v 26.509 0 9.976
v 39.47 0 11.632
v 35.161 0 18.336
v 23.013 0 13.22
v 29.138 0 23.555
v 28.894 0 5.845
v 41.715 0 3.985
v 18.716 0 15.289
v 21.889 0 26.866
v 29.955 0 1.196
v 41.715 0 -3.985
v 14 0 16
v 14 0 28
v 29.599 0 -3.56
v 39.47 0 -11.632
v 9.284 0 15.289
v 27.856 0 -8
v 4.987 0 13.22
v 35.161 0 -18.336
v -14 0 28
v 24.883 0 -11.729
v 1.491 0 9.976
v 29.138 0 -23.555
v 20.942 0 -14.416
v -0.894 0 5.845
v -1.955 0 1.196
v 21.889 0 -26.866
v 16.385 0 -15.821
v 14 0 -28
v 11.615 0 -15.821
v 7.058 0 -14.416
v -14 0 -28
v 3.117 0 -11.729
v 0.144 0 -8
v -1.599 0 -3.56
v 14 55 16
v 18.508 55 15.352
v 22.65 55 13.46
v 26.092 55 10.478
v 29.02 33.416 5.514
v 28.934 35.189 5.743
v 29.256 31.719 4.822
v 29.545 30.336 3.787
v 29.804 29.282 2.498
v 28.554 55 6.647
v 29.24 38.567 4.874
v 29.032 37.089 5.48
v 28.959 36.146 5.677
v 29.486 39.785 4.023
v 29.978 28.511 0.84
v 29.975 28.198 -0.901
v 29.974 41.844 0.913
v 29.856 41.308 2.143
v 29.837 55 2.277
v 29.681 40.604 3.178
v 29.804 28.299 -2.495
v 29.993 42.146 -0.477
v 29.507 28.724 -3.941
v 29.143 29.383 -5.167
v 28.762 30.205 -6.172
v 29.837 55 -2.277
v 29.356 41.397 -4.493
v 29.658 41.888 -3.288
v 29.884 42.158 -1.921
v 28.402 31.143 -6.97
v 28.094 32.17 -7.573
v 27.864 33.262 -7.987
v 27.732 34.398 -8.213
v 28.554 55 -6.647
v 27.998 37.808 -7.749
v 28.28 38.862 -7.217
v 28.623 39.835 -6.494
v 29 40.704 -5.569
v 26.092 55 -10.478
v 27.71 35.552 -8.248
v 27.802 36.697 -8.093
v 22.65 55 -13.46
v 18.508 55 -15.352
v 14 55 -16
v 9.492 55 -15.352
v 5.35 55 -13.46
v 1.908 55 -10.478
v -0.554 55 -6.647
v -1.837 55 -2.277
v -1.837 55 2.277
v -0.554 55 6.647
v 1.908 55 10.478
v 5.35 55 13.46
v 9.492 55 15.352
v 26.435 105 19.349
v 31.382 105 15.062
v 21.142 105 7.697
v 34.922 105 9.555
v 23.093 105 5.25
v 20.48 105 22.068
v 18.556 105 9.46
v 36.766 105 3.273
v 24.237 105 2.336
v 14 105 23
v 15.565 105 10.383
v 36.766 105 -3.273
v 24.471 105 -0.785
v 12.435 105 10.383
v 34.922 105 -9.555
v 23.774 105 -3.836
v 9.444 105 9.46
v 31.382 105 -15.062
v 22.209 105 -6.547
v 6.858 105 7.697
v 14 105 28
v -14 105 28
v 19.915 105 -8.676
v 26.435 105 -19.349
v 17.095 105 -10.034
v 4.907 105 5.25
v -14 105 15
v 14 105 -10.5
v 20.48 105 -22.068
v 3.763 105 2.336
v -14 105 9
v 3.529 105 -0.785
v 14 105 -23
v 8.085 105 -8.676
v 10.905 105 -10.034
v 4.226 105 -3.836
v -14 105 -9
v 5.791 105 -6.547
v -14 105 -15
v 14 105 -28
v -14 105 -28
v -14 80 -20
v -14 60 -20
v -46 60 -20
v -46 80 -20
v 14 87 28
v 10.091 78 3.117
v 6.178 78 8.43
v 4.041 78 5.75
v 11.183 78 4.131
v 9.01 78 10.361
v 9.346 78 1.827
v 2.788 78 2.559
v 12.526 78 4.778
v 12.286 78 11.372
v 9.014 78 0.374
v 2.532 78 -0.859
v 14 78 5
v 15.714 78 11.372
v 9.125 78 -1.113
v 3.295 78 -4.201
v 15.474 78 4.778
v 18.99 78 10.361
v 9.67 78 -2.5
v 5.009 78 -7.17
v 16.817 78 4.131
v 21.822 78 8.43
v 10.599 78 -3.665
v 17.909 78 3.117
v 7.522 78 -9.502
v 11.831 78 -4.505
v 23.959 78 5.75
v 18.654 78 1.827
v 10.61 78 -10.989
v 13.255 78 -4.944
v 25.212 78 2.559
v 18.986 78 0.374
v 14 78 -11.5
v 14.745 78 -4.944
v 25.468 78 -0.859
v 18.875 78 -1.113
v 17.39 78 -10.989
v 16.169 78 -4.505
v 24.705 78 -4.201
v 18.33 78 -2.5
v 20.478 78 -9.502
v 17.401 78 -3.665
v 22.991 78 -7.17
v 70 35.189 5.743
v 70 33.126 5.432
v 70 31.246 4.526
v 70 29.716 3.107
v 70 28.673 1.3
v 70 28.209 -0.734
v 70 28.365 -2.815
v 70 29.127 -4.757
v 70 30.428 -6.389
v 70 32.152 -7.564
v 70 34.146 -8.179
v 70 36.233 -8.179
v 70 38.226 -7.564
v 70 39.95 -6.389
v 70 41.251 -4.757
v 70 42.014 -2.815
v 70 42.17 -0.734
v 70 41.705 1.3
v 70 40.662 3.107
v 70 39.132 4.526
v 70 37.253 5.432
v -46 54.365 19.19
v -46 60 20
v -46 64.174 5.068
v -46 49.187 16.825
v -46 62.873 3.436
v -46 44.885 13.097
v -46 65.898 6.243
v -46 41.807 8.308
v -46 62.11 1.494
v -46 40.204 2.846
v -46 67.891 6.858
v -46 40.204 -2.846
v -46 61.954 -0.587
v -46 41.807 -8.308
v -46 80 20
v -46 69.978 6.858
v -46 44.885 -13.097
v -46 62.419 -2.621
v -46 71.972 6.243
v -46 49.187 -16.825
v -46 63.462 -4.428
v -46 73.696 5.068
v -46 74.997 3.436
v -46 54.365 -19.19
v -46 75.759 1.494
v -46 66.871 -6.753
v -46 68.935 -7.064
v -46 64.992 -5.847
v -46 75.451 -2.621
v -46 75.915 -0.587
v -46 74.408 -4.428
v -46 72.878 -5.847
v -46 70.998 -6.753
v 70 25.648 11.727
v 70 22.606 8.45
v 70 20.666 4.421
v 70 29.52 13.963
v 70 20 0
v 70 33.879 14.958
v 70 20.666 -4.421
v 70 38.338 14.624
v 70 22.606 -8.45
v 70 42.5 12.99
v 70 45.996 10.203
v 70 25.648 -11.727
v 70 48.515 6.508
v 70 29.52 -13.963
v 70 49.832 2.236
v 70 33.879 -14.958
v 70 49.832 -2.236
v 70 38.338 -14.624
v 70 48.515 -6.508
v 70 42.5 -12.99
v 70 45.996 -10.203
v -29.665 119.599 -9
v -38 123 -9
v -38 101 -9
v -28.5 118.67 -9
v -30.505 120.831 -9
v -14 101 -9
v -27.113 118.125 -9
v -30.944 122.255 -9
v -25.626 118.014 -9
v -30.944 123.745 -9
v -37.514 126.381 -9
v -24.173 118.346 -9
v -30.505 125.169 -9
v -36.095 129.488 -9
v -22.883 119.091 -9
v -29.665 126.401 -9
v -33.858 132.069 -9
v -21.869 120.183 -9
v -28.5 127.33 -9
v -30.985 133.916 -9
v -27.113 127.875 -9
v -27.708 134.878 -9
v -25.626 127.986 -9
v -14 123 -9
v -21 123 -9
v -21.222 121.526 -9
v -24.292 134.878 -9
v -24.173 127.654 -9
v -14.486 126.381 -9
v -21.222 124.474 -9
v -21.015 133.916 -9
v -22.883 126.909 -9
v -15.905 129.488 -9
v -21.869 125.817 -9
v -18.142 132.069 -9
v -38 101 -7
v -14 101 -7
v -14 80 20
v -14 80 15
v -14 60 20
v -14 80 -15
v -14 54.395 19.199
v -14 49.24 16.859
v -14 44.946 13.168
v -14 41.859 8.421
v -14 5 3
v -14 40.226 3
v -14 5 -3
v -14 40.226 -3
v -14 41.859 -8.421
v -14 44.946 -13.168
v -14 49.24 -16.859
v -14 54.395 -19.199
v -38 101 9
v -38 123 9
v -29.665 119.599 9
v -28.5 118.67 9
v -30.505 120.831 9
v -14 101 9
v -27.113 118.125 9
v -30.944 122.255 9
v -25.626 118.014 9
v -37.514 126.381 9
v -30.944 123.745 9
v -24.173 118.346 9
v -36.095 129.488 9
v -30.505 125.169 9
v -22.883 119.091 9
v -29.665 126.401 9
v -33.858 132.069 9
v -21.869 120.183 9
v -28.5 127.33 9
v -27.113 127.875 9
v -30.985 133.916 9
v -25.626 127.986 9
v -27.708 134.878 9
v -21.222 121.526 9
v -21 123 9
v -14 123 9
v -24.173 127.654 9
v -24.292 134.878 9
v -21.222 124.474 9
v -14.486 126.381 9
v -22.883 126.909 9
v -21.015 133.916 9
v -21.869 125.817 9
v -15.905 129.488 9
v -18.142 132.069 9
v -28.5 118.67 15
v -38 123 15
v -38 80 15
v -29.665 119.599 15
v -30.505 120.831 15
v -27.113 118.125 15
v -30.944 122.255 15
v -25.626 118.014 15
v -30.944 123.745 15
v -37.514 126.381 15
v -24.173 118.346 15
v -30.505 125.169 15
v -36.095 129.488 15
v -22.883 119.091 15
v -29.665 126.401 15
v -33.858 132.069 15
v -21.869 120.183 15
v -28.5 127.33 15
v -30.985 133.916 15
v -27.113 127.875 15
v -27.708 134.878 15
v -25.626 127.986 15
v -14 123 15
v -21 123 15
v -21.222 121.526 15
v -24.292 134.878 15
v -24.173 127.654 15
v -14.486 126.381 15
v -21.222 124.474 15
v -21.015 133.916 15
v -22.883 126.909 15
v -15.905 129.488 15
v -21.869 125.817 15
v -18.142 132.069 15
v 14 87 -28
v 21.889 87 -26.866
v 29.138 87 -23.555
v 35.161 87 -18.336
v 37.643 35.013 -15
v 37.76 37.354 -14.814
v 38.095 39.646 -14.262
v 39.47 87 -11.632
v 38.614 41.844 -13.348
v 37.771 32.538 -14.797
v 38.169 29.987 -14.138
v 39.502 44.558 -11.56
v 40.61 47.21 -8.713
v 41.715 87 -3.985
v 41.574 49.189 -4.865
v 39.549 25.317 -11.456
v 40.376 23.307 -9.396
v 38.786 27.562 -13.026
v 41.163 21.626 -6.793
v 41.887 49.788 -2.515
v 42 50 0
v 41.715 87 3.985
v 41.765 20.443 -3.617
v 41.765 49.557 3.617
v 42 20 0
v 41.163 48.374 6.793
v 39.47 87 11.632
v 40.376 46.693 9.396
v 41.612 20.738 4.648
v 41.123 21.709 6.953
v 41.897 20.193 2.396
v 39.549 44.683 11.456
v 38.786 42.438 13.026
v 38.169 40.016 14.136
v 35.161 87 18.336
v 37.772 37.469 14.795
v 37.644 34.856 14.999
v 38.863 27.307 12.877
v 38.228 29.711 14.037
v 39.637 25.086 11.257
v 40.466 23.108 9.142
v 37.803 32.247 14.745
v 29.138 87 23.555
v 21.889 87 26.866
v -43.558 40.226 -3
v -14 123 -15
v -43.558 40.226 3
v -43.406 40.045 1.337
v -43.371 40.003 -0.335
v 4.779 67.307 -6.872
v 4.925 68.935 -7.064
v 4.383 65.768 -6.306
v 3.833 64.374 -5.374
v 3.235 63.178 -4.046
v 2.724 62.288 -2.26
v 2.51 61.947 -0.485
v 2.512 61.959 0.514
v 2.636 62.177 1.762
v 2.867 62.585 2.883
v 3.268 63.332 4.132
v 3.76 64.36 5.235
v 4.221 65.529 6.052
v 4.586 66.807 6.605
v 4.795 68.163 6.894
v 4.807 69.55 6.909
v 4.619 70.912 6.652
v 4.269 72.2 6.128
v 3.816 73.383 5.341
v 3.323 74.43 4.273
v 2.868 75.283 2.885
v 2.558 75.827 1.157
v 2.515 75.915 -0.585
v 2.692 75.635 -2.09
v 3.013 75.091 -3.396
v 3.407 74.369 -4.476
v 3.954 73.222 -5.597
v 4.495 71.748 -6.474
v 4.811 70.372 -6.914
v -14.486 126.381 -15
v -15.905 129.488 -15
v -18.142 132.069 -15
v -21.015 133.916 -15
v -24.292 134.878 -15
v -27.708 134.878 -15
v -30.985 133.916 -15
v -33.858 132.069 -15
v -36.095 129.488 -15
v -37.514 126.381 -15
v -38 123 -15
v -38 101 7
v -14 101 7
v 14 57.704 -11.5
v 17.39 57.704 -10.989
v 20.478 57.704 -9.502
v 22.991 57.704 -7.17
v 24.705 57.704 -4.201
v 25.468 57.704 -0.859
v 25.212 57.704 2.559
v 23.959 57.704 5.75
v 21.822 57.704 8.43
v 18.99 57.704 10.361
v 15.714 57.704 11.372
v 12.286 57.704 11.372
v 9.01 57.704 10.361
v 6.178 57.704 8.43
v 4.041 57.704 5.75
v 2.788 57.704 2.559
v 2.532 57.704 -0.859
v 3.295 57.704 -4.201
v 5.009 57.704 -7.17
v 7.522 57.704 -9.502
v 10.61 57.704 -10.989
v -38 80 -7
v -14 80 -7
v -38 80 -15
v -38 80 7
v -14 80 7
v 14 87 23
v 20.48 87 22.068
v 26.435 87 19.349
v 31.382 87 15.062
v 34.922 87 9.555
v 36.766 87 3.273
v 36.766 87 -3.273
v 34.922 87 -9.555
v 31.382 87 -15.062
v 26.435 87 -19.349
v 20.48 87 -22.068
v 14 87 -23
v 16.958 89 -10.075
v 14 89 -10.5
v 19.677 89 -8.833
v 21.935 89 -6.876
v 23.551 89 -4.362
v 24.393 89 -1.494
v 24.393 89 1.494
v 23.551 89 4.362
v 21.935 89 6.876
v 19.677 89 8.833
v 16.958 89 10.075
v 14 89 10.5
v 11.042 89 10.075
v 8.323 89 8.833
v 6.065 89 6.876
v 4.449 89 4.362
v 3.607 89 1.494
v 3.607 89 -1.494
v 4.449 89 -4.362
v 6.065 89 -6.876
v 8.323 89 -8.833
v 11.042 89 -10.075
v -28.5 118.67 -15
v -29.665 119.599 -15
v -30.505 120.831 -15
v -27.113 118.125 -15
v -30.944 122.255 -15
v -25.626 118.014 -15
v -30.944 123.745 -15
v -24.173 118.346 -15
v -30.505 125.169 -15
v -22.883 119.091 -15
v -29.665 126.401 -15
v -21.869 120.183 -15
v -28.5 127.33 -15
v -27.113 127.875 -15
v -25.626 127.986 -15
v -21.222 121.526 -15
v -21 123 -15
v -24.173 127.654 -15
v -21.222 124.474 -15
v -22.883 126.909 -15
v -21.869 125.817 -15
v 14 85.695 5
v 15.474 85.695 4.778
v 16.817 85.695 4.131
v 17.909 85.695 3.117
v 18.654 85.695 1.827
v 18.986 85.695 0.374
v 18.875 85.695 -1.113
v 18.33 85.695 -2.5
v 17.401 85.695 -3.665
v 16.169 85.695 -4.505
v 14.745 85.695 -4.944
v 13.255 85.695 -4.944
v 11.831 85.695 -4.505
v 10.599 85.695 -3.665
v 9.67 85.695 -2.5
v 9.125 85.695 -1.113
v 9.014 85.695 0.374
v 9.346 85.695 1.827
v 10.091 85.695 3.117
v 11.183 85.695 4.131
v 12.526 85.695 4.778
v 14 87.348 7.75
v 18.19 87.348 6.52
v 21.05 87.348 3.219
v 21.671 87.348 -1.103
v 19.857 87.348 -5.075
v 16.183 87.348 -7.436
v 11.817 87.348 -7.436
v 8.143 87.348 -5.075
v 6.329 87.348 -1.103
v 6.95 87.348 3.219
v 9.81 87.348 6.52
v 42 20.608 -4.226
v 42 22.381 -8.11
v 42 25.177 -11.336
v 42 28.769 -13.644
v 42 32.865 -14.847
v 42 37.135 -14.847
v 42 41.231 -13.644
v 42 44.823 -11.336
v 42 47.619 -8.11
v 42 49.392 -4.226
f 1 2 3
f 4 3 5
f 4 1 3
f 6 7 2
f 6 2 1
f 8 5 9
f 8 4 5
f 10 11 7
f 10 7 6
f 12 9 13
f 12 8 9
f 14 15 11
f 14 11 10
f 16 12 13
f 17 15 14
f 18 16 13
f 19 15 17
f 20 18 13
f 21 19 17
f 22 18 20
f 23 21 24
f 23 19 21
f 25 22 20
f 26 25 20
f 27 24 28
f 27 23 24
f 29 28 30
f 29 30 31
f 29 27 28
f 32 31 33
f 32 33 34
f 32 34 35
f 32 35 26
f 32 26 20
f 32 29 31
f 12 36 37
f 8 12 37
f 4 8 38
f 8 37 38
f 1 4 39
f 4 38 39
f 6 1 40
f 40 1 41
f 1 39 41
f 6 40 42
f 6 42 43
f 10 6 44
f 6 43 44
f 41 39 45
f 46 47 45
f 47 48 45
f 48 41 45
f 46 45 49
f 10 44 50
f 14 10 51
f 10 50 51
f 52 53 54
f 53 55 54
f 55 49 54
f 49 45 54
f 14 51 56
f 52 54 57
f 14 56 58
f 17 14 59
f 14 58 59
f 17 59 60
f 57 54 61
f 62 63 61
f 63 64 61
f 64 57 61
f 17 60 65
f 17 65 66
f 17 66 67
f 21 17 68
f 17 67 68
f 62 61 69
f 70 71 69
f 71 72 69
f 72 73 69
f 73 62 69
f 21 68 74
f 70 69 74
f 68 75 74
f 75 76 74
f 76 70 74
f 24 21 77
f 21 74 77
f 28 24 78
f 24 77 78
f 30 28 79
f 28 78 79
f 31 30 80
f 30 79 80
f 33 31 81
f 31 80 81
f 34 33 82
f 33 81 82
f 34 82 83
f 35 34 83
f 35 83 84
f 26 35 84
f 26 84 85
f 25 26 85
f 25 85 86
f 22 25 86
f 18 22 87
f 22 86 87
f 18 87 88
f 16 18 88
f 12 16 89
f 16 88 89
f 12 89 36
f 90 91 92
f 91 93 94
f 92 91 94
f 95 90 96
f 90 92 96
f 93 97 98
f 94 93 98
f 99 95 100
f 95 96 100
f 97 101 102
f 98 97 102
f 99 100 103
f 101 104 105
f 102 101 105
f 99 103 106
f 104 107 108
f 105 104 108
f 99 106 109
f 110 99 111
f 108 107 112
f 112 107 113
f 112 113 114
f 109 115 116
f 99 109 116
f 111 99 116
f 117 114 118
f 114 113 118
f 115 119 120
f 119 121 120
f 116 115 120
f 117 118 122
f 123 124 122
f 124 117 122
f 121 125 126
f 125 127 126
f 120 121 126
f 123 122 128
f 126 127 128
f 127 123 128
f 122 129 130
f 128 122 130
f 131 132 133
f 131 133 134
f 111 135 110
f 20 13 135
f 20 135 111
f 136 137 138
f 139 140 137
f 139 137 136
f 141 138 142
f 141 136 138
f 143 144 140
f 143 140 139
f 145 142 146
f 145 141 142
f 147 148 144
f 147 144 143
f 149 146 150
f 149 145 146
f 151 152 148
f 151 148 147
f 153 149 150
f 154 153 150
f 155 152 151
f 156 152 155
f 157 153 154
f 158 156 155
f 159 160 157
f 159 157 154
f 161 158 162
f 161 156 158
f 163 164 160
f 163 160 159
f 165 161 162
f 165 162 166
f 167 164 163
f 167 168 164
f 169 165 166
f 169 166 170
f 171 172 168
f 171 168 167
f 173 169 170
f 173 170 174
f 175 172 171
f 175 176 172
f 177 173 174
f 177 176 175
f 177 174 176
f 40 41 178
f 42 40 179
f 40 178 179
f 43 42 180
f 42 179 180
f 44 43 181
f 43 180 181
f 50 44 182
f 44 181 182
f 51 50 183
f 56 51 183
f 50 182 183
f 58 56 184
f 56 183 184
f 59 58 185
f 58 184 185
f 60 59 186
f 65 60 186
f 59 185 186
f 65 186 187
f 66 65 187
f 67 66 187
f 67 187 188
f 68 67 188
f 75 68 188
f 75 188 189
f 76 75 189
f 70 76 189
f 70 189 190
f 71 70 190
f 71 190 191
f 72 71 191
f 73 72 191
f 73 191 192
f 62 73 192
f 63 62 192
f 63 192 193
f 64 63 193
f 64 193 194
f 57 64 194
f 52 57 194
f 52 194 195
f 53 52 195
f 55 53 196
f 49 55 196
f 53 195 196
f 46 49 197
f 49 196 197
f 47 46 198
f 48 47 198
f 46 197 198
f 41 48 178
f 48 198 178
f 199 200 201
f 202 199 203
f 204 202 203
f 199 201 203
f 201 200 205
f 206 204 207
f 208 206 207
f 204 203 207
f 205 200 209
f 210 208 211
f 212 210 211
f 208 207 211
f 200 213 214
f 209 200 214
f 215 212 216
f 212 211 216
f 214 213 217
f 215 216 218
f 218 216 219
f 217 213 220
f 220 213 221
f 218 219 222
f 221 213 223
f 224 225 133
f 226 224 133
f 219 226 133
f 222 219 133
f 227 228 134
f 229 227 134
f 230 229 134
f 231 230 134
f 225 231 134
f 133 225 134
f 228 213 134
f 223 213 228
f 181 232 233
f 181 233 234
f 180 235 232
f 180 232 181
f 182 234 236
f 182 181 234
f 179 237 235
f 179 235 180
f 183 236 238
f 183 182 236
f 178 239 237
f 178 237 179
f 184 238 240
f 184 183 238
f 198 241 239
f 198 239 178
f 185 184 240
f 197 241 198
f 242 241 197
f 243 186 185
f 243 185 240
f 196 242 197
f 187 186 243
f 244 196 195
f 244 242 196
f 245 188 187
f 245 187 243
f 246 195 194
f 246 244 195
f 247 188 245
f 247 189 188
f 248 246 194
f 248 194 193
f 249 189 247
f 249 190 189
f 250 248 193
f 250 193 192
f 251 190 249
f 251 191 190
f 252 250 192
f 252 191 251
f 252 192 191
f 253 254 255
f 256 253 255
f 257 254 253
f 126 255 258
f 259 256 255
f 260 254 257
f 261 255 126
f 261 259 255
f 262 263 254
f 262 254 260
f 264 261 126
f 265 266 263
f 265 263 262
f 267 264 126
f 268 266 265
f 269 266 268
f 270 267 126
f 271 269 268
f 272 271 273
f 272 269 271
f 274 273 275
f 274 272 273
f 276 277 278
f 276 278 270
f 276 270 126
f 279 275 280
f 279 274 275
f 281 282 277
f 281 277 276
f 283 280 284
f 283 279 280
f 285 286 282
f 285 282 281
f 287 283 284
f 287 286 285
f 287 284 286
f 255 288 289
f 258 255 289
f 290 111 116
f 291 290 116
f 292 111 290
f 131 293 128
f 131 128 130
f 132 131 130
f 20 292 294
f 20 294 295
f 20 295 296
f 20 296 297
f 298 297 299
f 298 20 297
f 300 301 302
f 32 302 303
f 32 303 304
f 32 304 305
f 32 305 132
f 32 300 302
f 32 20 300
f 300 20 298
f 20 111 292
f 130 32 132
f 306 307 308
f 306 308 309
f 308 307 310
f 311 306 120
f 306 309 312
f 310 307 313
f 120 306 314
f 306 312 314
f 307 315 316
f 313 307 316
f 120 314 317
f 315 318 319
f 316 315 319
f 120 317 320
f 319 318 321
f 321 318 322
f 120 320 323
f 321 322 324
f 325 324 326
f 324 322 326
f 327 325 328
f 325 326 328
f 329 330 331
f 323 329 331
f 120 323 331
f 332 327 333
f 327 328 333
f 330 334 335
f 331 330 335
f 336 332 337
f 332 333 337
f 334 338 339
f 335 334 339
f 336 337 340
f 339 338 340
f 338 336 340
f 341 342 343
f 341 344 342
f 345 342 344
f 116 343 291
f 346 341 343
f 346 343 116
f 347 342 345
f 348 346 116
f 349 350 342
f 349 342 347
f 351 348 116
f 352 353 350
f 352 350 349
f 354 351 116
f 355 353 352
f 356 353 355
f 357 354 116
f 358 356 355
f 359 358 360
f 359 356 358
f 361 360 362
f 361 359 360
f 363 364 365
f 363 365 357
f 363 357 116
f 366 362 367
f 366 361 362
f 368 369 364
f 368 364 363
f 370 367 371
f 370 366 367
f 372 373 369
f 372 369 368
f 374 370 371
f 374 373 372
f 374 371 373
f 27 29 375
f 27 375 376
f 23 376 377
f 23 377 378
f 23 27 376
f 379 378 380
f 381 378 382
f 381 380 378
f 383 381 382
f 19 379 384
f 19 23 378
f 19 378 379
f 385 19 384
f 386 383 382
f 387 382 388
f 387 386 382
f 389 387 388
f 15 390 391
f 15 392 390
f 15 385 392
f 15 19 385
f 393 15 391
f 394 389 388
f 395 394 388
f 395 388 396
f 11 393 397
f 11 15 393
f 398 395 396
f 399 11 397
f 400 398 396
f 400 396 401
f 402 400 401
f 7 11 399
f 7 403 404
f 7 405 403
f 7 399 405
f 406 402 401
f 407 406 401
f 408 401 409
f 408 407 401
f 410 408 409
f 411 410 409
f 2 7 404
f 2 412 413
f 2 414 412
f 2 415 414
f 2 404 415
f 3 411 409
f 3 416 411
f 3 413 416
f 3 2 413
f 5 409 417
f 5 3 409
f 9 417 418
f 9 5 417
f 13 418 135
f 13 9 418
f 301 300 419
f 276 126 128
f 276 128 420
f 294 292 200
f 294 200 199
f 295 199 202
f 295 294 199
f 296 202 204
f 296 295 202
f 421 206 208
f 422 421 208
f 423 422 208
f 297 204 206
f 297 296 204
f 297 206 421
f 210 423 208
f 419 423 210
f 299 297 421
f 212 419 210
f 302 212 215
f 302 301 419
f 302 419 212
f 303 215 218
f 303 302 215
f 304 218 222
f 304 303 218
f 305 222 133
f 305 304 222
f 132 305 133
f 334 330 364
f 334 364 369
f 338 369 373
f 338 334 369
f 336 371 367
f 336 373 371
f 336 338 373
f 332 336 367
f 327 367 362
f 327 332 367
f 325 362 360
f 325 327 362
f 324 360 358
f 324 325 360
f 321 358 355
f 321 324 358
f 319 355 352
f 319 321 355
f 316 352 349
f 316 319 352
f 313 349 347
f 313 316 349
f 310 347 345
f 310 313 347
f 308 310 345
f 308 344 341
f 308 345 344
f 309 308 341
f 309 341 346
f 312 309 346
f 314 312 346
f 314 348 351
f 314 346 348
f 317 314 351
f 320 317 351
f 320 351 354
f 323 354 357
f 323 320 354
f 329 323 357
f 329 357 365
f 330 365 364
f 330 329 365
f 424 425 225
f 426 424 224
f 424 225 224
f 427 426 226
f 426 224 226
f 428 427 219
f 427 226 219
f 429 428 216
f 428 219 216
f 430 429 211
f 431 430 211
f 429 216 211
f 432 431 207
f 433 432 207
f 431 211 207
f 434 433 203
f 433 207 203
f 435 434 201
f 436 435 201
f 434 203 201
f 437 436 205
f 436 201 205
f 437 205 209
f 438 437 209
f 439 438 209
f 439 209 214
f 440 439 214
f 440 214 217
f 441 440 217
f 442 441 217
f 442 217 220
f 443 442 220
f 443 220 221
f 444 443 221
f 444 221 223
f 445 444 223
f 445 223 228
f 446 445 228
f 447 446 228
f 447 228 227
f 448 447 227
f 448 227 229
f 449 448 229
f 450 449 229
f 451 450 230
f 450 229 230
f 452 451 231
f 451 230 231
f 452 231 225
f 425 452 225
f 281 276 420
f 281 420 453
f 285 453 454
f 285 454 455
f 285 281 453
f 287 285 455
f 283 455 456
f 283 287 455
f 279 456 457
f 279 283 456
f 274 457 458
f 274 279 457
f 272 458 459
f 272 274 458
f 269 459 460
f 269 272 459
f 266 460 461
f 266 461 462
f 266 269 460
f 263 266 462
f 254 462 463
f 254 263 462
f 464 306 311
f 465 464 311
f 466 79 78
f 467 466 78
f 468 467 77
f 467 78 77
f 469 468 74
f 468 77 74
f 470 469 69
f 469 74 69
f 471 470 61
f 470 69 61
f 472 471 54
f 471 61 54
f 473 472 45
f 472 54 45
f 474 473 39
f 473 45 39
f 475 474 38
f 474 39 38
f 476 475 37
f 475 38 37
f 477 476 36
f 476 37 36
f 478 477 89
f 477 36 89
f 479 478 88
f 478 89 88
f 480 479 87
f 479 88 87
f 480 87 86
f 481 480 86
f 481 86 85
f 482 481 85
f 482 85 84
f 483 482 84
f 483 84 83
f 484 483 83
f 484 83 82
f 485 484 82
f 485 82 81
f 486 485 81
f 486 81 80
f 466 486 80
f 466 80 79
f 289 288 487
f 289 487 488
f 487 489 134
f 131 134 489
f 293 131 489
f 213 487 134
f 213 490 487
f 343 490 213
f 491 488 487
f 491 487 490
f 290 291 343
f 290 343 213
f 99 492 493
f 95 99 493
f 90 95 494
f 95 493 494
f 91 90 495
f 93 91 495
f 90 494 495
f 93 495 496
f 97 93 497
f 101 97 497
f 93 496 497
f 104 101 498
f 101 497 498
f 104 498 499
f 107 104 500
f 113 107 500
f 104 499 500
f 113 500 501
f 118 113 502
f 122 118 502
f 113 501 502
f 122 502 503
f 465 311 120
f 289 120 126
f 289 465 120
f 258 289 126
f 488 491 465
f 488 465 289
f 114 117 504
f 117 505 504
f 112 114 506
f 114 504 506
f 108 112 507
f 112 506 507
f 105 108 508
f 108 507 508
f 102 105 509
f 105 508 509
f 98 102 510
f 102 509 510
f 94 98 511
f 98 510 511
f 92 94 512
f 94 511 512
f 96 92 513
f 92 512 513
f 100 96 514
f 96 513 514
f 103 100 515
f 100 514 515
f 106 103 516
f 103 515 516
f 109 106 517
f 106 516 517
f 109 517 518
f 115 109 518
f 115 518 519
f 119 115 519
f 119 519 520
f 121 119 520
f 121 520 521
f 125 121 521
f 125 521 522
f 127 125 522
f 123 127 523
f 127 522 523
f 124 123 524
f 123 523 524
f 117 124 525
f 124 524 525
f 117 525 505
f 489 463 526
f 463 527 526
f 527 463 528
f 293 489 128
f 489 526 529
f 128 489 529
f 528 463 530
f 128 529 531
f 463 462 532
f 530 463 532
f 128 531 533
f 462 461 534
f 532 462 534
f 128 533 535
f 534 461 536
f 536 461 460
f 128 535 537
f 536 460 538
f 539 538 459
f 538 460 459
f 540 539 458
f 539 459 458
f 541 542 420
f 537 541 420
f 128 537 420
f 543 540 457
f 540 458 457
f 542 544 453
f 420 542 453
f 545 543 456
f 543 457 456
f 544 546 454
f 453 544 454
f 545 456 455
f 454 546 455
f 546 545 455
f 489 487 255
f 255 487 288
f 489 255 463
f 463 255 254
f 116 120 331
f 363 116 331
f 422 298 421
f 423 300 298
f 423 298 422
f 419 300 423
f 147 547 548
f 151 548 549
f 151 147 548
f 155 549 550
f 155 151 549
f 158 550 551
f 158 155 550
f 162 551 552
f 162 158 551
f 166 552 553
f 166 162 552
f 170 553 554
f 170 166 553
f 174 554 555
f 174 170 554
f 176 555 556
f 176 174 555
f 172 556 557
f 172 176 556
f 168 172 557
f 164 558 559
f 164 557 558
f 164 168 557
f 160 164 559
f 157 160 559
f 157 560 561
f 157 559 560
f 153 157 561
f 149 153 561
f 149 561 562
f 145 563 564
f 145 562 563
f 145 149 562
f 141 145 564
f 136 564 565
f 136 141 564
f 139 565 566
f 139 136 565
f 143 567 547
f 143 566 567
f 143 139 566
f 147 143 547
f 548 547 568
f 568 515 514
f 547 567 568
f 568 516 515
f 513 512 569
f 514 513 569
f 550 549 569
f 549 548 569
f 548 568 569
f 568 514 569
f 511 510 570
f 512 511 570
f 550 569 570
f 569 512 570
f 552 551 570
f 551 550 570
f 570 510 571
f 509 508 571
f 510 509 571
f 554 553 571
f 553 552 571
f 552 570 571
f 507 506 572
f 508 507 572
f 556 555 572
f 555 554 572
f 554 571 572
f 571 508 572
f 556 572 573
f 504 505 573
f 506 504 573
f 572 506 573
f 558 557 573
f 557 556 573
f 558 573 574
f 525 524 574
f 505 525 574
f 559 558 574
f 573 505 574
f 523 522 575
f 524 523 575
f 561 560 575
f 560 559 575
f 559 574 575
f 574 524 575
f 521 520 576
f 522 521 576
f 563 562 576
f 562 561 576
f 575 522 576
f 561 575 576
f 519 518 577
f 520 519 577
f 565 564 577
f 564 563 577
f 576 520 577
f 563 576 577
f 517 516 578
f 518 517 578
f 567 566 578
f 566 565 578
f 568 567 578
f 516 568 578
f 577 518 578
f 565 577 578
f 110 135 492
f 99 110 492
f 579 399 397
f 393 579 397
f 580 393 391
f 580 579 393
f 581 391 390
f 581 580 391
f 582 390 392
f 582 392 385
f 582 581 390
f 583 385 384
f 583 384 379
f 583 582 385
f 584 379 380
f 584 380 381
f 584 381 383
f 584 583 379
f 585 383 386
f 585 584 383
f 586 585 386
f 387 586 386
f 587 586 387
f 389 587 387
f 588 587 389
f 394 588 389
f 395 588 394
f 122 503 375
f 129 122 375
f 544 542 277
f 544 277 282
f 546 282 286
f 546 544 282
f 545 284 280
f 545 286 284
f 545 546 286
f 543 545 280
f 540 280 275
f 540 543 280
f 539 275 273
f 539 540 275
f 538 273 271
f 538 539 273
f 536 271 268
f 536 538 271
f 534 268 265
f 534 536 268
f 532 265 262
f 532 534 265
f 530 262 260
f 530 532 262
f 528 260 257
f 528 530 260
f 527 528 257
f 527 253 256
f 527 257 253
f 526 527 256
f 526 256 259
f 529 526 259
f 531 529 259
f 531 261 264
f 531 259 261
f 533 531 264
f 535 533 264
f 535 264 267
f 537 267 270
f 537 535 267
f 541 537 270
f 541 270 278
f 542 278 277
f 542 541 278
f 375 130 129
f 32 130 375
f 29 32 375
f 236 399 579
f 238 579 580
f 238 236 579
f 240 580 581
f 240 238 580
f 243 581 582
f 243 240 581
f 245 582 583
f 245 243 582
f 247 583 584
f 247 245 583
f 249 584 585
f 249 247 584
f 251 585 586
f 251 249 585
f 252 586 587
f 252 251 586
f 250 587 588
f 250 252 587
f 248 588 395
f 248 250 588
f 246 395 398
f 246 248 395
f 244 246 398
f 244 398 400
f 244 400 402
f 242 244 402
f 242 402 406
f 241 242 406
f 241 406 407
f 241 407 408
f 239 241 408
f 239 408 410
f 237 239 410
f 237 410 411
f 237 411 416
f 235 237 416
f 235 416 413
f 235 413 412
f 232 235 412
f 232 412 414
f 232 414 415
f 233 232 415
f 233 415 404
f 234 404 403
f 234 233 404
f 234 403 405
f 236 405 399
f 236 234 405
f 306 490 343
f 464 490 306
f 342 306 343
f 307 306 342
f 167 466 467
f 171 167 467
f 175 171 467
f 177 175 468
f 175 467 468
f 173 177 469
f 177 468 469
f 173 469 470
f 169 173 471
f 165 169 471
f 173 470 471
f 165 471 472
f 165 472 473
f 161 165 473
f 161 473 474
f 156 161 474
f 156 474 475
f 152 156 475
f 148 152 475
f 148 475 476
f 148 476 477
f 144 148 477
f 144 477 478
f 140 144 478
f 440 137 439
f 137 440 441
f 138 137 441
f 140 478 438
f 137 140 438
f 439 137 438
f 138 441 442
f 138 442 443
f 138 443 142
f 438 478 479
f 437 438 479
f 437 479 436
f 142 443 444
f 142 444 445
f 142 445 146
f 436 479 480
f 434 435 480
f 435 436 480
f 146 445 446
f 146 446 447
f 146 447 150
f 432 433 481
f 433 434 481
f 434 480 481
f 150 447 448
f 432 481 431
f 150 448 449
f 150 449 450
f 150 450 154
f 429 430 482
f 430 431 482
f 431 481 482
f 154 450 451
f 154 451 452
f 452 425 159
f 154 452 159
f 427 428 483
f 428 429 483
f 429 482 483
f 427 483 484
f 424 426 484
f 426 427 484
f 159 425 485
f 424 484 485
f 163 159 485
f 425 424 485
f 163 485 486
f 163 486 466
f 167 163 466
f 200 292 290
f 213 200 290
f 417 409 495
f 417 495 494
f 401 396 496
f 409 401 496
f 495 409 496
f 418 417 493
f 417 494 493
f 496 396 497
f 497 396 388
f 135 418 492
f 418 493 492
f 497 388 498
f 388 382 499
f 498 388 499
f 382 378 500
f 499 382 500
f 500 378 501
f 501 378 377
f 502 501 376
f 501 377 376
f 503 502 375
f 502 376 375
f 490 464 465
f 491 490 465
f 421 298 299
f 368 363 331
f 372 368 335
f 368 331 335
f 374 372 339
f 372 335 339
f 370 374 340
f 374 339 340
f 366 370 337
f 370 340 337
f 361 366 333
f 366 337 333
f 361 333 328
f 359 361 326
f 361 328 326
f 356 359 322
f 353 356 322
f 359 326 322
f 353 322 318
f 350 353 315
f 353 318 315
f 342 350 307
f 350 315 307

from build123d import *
from build123d.topology import SkipClean

# Parameters (mm, degrees)
EXTRUDE_1_DEPTH          = 105
SKETCH_2_W               = 40
SKETCH_2_H               = 20
EXTRUDE_2_DEPTH          = 32
EXTRUDE_4_REACH          = 141.832
SKETCH_3_R               = 15
EXTRUDE_START            = 28
EXTRUDE_5_DEPTH          = 28
EXTRUDE_START_2          = 7
SKETCH_5_W               = 24
SKETCH_5_H               = 43
EXTRUDE_6_DEPTH          = 8
SKETCH_6_W               = 24
SKETCH_6_H               = 50
CUT_EXTRUDE_1_DEPTH      = 9
CUT_EXTRUDE_2_DEPTH      = 159.031642473
CUT_EXTRUDE_2_DEPTH_BACK = 159.031642473
SKETCH_7_R               = 5
RIB_1_REACH              = 156.625
SKETCH_8_WALL_W          = 356.93996261
SKETCH_8_WALL_H          = 6
CUT_EXTRUDE_START        = -18
CUT_EXTRUDE_3_DEPTH      = 18
HOLE_WIZARD_M36_2_D      = 32
HOLE_WIZARD_M36_2_DEPTH  = 55
HOLE_WIZARD_M36_2_TIP    = 9.613769904
SKETCH_14_R              = 11.5
CUT_EXTRUDE_4_DEPTH      = 78
HOLE_WIZARD_M24_1_D      = 21
HOLE_WIZARD_M24_1_DEPTH  = 16
HOLE_WIZARD_M24_1_TIP    = 6.3090365
CUT_EXTRUDE_5_DEPTH      = 130.263297345
CUT_EXTRUDE_5_DEPTH_BACK = 130.263297345
SKETCH_16_R              = 5
HOLE_WIZARD_M16_1_REACH  = 139.824
HOLE_WIZARD_M16_1_BORE_R = 7
HOLE_WIZARD_M16_2_REACH  = 157.802
HOLE_WIZARD_M16_2_BORE_R = 7


with BuildPart() as part:
    # 草图1 → 凸台-拉伸1 (new body)
    with BuildSketch(Plane(origin=(0, 0, 0), x_dir=(1, 0, 0), z_dir=(0, 1, 0))):
        with BuildLine():
            Line((-14, 28), (14, 28))
            ThreePointArc((14, 28), (42, 0), (14, -28))
            Line((14, -28), (-14, -28))
            Line((-14, -28), (-14, 28))
        make_face()
    extrude(amount=EXTRUDE_1_DEPTH)

    # 草图2 → 凸台-拉伸2 (add)
    with BuildSketch(Plane.ZY.offset(14)):
        with BuildLine():
            ThreePointArc((20, 60), (0, 40), (-20, 60))
            Line((-20, 60), (20, 60))
        make_face()
        with Locations((0, 70)):
            Rectangle(SKETCH_2_W, SKETCH_2_H)
    extrude(amount=EXTRUDE_2_DEPTH)

    # 草图3 → 凸台-拉伸4 (add, up to next)
    with BuildSketch(Plane(origin=(42, 0, 0), x_dir=(0, 0, -1), z_dir=(1, 0, 0)), mode=Mode.PRIVATE) as extrude_4_sk1:
        with Locations((0, 35)):
            Circle(SKETCH_3_R)
    extrude_4_tool1 = extrude(extrude_4_sk1.sketch, amount=-EXTRUDE_4_REACH, mode=Mode.PRIVATE) - part.part
    add(extrude_4_tool1.solids().sort_by_distance((42, 35, 0))[0])
    add(extrude_4_tool1.solids().sort_by_distance((42, 35, 0))[1])

    # 草图4 → 凸台-拉伸5 (add)
    with SkipClean():  # the faces are left unmerged after this step: merging them gives an invalid solid
        with BuildSketch(Plane(origin=(42, 0, 0), x_dir=(0, 0, -1), z_dir=(1, 0, 0)).offset(EXTRUDE_START)):
            with BuildLine():
                ThreePointArc((0, 50), (-15, 35), (0, 20))
                ThreePointArc((0, 20), (15, 35), (0, 50))
            make_face()
        extrude(amount=-EXTRUDE_5_DEPTH)

    # 草图5 → 凸台-拉伸6 (add)
    with BuildSketch(Plane.XY.offset(EXTRUDE_START_2)):
        with Locations((-26, 101.5)):
            Rectangle(SKETCH_5_W, SKETCH_5_H)
        with BuildLine():
            Line((-38, 123), (-14, 123))
            ThreePointArc((-14, 123), (-26, 135), (-38, 123))
        make_face()
    extrude_6 = extrude(amount=EXTRUDE_6_DEPTH)

    # 镜向1: 凸台-拉伸6 across plane
    add(extrude_6.mirror(Plane.XY))

    # 草图6 → 切除-拉伸1 (cut, symmetric)
    with BuildSketch(Plane.XY):
        with Locations((-26, 126)):
            Rectangle(SKETCH_6_W, SKETCH_6_H)
    extrude(amount=CUT_EXTRUDE_1_DEPTH, both=True, mode=Mode.SUBTRACT)

    # 草图7 → 切除-拉伸2 (cut, two sides: drawn at the far end of the back side and taken through both)
    with BuildSketch(Plane.XY.offset(15).offset(-CUT_EXTRUDE_2_DEPTH_BACK)):
        with Locations((-26, 123)):
            Circle(SKETCH_7_R)
    extrude(amount=CUT_EXTRUDE_2_DEPTH + CUT_EXTRUDE_2_DEPTH_BACK, mode=Mode.SUBTRACT)

    # 草图8 wall → 筋1 (add, up to next)
    with BuildSketch(Plane(origin=(-28.684243545, 22.5, 0), x_dir=(-0.642787609684, 0.766044443121, 0), z_dir=(-0.766044443121, -0.642787609684, 0)), mode=Mode.PRIVATE) as rib_1_sk1:
        Rectangle(SKETCH_8_WALL_W, SKETCH_8_WALL_H)
    rib_1_tool1 = extrude(rib_1_sk1.sketch, amount=-RIB_1_REACH, mode=Mode.PRIVATE) - part.part
    add(rib_1_tool1.solids().sort_by_distance((-28.684243545, 22.5, 0))[0])

    # 草图9 → 切除-拉伸3 (cut)
    with BuildSketch(Plane(origin=(0, 105, 0), x_dir=(1, 0, 0), z_dir=(0, 1, 0)).offset(CUT_EXTRUDE_START)):
        with BuildLine():
            Line((14, 23), (14, 28))
            ThreePointArc((14, 28), (42, 0), (14, -28))
            Line((14, -28), (14, -23))
            ThreePointArc((14, -23), (37, 0), (14, 23))
        make_face()
    extrude(amount=CUT_EXTRUDE_3_DEPTH, mode=Mode.SUBTRACT)

    # M36 螺纹孔2
    with Locations(Plane(origin=(14, 0, 0), x_dir=(0, 0, -1), z_dir=(0, -1, 0))):
        with Locations((0, 0)):
            Hole(HOLE_WIZARD_M36_2_D / 2, depth=HOLE_WIZARD_M36_2_DEPTH)
            with Locations((0, 0, -(HOLE_WIZARD_M36_2_DEPTH + HOLE_WIZARD_M36_2_TIP / 2))):  # 118° drill point
                Cone(0, HOLE_WIZARD_M36_2_D / 2, HOLE_WIZARD_M36_2_TIP, mode=Mode.SUBTRACT)

    # 草图14 → 切除-拉伸4 (cut)
    with BuildSketch(Plane.XZ):
        with Locations(Location((14, 0, 0), (0, 0, 270))):
            Circle(SKETCH_14_R)
    extrude(amount=-CUT_EXTRUDE_4_DEPTH, mode=Mode.SUBTRACT)

    # M24 螺纹孔1
    with Locations(Plane(origin=(14, 105, 0), x_dir=(0, 0, 1), z_dir=(0, 1, 0))):
        with Locations((0, 0)):
            Hole(HOLE_WIZARD_M24_1_D / 2, depth=HOLE_WIZARD_M24_1_DEPTH)
            with Locations((0, 0, -(HOLE_WIZARD_M24_1_DEPTH + HOLE_WIZARD_M24_1_TIP / 2))):  # 118° drill point
                Cone(0, HOLE_WIZARD_M24_1_D / 2, HOLE_WIZARD_M24_1_TIP, mode=Mode.SUBTRACT)

    # 草图16 → 切除-拉伸5 (cut, two sides: drawn at the far end of the back side and taken through both)
    with BuildSketch(Plane(origin=(0, 105, 0), x_dir=(1, 0, 0), z_dir=(0, 1, 0)).offset(-CUT_EXTRUDE_5_DEPTH_BACK)):
        with Locations(Location((14, 0, 0), (0, 0, 270))):
            Circle(SKETCH_16_R)
    extrude(amount=CUT_EXTRUDE_5_DEPTH + CUT_EXTRUDE_5_DEPTH_BACK, mode=Mode.SUBTRACT)

    # M16 螺纹孔1 bore (on position points) → M16 螺纹孔1 (cut, up to next)
    with BuildSketch(Plane(origin=(-46, 68.934751758, -0.063559522), x_dir=(0, 0, -1), z_dir=(-1, 0, 0)), mode=Mode.PRIVATE) as hole_wizard_m16_1_sk1:
        Circle(HOLE_WIZARD_M16_1_BORE_R)
    hole_wizard_m16_1_tool1 = extrude(hole_wizard_m16_1_sk1.sketch, amount=-HOLE_WIZARD_M16_1_REACH, mode=Mode.PRIVATE) & part.part
    add(hole_wizard_m16_1_tool1.solids().sort_by_distance((-46, 68.934752, -0.06356))[0], mode=Mode.SUBTRACT)

    # M16 螺纹孔2 bore (on position points) → M16 螺纹孔2 (cut, up to next)
    with BuildSketch(Plane(origin=(70, 35.189243523, -1.257452157), x_dir=(0, 0, 1), z_dir=(1, 0, 0)), mode=Mode.PRIVATE) as hole_wizard_m16_2_sk1:
        Circle(HOLE_WIZARD_M16_2_BORE_R)
    hole_wizard_m16_2_tool1 = extrude(hole_wizard_m16_2_sk1.sketch, amount=-HOLE_WIZARD_M16_2_REACH, mode=Mode.PRIVATE) & part.part
    add(hole_wizard_m16_2_tool1.solids().sort_by_distance((70, 35.189244, -1.257452))[0], mode=Mode.SUBTRACT)


solid = part.part
